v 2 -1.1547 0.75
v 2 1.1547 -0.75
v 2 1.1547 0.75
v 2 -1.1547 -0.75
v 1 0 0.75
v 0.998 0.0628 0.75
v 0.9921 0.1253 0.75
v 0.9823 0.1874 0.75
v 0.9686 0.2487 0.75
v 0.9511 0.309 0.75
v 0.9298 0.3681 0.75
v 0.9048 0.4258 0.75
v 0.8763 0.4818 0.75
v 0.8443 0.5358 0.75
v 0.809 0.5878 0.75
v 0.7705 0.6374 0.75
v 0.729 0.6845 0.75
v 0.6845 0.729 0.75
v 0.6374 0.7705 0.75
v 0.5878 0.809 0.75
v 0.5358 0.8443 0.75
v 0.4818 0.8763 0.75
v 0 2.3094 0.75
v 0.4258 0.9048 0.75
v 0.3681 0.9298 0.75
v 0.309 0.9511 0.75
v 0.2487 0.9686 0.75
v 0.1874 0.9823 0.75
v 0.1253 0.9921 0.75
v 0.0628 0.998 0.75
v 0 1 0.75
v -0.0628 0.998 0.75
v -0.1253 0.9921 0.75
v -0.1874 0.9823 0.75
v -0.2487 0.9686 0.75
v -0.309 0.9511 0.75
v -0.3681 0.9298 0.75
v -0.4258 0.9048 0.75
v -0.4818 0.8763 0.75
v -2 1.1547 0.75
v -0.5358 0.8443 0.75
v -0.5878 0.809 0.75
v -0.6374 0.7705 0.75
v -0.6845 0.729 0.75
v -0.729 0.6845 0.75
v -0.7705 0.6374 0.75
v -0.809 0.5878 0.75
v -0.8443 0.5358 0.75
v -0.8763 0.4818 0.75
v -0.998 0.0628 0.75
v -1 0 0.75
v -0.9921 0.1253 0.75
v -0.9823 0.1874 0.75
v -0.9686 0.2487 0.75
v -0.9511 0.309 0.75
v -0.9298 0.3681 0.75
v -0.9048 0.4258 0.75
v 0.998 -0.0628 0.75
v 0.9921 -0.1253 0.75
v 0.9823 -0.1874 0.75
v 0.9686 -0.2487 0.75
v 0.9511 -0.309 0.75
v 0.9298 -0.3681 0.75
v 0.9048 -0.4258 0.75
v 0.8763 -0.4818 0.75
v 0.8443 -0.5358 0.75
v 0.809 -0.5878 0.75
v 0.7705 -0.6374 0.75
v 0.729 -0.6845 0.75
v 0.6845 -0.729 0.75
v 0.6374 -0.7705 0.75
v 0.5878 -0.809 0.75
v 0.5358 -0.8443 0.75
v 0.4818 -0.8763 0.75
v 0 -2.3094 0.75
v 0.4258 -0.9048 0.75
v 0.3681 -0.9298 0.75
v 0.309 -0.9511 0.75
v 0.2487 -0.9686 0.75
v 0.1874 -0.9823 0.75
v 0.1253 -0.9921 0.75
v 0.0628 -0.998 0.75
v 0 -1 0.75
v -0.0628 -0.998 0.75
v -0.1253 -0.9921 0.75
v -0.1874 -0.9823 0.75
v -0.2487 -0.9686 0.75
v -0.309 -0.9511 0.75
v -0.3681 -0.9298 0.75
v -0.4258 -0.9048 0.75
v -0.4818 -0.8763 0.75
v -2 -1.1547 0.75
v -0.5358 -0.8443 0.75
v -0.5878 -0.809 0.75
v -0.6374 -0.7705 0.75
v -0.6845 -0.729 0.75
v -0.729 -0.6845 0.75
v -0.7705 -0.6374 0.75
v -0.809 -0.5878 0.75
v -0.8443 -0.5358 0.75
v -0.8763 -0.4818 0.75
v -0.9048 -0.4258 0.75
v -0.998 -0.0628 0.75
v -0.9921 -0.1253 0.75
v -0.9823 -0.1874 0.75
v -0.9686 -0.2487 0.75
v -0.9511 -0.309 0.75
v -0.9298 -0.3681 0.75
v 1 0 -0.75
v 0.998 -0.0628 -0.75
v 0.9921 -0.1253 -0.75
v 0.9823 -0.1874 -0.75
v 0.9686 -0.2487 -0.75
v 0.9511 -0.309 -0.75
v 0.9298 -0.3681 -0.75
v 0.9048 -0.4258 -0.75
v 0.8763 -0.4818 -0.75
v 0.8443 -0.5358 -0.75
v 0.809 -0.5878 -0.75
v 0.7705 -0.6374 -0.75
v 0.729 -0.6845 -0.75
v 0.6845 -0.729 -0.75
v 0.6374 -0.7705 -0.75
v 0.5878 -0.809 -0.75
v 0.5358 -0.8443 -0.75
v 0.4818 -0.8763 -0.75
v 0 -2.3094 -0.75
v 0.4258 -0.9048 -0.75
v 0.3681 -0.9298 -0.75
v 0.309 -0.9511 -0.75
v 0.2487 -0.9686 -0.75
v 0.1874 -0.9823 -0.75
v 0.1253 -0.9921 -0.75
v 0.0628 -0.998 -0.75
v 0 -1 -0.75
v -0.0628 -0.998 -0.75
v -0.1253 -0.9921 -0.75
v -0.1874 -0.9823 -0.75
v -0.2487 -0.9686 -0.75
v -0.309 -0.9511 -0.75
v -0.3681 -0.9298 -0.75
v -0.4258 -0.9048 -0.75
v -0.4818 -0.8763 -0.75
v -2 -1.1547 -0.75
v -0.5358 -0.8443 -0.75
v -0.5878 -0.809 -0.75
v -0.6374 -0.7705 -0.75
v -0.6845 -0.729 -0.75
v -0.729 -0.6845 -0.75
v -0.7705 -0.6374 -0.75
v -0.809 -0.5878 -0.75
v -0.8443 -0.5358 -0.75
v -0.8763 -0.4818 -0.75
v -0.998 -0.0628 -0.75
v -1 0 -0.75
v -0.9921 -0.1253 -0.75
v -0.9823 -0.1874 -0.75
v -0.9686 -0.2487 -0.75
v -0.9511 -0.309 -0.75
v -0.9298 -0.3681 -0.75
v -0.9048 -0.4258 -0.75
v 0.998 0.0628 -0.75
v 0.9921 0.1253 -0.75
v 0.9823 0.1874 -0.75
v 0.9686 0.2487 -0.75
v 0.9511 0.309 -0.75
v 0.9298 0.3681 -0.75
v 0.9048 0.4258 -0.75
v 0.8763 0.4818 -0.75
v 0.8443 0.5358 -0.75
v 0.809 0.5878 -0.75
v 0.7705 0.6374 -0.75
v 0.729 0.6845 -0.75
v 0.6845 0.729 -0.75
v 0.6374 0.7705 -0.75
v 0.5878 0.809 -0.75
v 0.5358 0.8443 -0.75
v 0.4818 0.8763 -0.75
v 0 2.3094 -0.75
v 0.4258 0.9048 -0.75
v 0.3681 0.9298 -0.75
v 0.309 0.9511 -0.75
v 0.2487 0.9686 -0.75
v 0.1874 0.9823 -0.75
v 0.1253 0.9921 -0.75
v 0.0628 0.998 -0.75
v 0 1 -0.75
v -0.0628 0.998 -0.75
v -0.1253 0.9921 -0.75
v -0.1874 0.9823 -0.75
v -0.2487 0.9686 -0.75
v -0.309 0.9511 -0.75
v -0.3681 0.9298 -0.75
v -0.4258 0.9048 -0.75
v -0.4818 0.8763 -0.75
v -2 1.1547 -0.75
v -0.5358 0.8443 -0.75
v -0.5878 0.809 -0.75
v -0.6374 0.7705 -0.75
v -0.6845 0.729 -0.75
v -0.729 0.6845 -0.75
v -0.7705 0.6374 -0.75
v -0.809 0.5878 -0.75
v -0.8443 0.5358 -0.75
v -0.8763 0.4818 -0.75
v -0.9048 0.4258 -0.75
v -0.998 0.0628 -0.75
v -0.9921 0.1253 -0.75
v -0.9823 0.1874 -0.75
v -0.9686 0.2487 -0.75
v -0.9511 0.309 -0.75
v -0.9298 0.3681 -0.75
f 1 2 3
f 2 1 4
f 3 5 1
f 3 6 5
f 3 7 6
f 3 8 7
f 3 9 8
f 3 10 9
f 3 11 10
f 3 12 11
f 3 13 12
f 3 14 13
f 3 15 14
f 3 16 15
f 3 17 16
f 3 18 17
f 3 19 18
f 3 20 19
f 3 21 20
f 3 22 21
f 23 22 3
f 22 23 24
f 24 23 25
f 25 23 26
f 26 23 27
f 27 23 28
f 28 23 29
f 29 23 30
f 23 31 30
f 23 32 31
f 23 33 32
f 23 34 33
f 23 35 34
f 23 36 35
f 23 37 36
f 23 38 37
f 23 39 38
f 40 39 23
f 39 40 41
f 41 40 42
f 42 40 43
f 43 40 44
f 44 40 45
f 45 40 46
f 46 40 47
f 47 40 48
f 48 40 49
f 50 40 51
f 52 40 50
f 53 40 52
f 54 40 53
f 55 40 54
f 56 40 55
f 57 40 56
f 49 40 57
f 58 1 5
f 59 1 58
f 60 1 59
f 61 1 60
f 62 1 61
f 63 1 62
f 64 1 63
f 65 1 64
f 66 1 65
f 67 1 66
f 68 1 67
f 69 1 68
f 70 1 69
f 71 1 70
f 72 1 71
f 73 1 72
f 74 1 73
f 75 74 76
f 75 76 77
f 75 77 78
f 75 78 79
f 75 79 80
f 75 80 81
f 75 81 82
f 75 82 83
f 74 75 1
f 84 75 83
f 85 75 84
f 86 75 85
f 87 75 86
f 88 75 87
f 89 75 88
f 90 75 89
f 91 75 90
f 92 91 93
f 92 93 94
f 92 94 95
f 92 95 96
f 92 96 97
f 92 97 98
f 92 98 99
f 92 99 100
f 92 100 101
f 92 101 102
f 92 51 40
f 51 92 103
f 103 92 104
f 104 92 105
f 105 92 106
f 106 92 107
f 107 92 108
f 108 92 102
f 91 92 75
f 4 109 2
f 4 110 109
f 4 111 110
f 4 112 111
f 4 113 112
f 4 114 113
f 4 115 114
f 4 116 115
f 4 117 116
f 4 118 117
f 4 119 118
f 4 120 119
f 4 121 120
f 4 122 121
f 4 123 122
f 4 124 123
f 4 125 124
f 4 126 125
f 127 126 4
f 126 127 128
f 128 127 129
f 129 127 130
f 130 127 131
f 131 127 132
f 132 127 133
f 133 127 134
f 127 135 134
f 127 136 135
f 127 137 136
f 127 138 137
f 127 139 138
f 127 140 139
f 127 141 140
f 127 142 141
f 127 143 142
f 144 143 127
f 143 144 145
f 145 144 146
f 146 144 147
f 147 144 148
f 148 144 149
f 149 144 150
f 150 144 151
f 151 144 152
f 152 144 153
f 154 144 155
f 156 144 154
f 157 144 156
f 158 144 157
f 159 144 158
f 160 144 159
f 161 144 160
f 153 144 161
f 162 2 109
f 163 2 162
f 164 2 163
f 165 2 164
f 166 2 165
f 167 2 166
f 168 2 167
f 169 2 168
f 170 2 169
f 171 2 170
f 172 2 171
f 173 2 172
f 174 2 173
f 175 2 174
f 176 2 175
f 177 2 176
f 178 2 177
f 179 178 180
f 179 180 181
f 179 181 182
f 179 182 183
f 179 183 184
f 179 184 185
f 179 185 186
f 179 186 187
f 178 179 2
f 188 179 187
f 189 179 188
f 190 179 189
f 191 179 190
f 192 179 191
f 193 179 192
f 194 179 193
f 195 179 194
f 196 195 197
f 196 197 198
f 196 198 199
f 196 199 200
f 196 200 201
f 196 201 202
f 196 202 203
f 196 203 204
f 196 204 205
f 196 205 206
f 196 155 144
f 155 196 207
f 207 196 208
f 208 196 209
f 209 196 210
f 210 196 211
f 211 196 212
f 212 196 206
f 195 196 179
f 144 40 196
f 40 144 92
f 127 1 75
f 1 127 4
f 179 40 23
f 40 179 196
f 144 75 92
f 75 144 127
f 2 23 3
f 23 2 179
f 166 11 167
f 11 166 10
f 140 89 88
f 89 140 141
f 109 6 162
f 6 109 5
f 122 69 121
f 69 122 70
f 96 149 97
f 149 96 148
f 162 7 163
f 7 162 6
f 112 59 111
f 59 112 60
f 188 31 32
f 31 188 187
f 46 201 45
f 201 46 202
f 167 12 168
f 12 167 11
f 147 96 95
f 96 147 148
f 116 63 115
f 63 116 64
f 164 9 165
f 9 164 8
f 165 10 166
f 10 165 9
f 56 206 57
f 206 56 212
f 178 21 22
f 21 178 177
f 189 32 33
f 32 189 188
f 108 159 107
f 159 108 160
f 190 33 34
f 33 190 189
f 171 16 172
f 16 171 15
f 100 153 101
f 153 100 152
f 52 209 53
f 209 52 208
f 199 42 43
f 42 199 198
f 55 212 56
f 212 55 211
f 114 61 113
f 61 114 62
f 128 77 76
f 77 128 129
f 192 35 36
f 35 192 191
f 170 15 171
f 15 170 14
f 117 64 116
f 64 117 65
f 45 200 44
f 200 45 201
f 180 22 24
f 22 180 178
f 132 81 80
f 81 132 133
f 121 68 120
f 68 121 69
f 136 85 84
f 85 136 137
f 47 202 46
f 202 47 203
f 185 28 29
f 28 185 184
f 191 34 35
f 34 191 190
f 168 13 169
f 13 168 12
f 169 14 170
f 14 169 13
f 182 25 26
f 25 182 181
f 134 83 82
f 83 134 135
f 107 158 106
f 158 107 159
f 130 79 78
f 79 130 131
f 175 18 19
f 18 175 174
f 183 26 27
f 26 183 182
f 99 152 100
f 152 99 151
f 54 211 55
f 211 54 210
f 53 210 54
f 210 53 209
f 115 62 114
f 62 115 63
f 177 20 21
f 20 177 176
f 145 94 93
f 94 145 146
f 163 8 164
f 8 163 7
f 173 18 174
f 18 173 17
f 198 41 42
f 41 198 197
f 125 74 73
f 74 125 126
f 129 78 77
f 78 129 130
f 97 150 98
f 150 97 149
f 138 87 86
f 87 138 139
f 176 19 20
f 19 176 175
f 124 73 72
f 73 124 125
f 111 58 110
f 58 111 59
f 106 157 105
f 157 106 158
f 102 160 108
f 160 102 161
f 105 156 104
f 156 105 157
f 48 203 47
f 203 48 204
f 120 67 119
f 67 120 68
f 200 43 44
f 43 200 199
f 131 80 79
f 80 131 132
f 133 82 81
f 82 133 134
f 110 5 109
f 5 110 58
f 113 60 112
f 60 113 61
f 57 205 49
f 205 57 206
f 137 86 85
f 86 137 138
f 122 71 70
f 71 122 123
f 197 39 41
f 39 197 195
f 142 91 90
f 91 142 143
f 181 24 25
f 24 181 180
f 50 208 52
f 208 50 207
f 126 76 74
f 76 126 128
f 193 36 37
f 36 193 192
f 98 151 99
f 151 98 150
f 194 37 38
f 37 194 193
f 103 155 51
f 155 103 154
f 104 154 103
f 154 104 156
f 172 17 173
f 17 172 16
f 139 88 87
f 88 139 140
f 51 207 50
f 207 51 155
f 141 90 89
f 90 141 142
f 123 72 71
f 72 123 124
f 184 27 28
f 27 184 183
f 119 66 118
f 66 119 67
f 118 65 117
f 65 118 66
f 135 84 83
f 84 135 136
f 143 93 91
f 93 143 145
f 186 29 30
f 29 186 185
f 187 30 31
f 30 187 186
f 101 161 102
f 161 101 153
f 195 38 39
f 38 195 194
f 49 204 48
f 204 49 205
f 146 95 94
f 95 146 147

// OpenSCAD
$fn = 100;

module make_hex_nut(w, h, d=0){
    // d = inner diameter
    // w = width across the flats
    // h = height or thickness
    s = w/sqrt(3);
    difference(){
        union(){
            for(i=[0:1:2]){
                rotate([0,0,120*i])
                cube([w, s, h], center=true);
            }
        }
        if(d){
            cylinder(d=d, h=h+1, center=true);
        }
    }
}

//make_hex_nut(w=5, h=2, d=2.5);

module make_nut_2(d=2){
    make_hex_nut(w=4.8, h=2, d=d);
}

module make_nut_w4_h1p5(d=2){
    make_hex_nut(w=4, h=1.5, d=d);
}

module make_nut_2_5(d=2, h=3.5){
    make_hex_nut(w=5+0.5/2, h=h, d=d);
}

module make_nut_2_5_test(){
    difference(){
        translate([0,0,-.5])
        cube([10,10,2], center=true);
        make_nut_2_5(d=0);
    }
}

module make_nut_2_5_test_downward(){
    difference(){
        translate([0,0,1])
        cube([10,10,2*2.5], center=true);
        color("red")
        make_nut_2_5(d=0);
        color("blue")
        cylinder(d=2.5, h=10, center=true);
    }
}

module make_nut_2_5_test_punchout(){
    difference(){
        translate([0,0,1.5])
        cube([10,10,2*1.5], center=true);
        color("red")
        make_nut_2_5(d=0);
        color("blue")
        cylinder(d=2.5, h=10, center=true);
    }
    color("green")
    translate([0,0,1.8])
    cube([10,10,0.25], center=true);
}

//make_nut_2_5_test();
make_nut_w4_h1p5();
//make_nut_2_5_test_downward();
//make_nut_2_5_test_punchout();
